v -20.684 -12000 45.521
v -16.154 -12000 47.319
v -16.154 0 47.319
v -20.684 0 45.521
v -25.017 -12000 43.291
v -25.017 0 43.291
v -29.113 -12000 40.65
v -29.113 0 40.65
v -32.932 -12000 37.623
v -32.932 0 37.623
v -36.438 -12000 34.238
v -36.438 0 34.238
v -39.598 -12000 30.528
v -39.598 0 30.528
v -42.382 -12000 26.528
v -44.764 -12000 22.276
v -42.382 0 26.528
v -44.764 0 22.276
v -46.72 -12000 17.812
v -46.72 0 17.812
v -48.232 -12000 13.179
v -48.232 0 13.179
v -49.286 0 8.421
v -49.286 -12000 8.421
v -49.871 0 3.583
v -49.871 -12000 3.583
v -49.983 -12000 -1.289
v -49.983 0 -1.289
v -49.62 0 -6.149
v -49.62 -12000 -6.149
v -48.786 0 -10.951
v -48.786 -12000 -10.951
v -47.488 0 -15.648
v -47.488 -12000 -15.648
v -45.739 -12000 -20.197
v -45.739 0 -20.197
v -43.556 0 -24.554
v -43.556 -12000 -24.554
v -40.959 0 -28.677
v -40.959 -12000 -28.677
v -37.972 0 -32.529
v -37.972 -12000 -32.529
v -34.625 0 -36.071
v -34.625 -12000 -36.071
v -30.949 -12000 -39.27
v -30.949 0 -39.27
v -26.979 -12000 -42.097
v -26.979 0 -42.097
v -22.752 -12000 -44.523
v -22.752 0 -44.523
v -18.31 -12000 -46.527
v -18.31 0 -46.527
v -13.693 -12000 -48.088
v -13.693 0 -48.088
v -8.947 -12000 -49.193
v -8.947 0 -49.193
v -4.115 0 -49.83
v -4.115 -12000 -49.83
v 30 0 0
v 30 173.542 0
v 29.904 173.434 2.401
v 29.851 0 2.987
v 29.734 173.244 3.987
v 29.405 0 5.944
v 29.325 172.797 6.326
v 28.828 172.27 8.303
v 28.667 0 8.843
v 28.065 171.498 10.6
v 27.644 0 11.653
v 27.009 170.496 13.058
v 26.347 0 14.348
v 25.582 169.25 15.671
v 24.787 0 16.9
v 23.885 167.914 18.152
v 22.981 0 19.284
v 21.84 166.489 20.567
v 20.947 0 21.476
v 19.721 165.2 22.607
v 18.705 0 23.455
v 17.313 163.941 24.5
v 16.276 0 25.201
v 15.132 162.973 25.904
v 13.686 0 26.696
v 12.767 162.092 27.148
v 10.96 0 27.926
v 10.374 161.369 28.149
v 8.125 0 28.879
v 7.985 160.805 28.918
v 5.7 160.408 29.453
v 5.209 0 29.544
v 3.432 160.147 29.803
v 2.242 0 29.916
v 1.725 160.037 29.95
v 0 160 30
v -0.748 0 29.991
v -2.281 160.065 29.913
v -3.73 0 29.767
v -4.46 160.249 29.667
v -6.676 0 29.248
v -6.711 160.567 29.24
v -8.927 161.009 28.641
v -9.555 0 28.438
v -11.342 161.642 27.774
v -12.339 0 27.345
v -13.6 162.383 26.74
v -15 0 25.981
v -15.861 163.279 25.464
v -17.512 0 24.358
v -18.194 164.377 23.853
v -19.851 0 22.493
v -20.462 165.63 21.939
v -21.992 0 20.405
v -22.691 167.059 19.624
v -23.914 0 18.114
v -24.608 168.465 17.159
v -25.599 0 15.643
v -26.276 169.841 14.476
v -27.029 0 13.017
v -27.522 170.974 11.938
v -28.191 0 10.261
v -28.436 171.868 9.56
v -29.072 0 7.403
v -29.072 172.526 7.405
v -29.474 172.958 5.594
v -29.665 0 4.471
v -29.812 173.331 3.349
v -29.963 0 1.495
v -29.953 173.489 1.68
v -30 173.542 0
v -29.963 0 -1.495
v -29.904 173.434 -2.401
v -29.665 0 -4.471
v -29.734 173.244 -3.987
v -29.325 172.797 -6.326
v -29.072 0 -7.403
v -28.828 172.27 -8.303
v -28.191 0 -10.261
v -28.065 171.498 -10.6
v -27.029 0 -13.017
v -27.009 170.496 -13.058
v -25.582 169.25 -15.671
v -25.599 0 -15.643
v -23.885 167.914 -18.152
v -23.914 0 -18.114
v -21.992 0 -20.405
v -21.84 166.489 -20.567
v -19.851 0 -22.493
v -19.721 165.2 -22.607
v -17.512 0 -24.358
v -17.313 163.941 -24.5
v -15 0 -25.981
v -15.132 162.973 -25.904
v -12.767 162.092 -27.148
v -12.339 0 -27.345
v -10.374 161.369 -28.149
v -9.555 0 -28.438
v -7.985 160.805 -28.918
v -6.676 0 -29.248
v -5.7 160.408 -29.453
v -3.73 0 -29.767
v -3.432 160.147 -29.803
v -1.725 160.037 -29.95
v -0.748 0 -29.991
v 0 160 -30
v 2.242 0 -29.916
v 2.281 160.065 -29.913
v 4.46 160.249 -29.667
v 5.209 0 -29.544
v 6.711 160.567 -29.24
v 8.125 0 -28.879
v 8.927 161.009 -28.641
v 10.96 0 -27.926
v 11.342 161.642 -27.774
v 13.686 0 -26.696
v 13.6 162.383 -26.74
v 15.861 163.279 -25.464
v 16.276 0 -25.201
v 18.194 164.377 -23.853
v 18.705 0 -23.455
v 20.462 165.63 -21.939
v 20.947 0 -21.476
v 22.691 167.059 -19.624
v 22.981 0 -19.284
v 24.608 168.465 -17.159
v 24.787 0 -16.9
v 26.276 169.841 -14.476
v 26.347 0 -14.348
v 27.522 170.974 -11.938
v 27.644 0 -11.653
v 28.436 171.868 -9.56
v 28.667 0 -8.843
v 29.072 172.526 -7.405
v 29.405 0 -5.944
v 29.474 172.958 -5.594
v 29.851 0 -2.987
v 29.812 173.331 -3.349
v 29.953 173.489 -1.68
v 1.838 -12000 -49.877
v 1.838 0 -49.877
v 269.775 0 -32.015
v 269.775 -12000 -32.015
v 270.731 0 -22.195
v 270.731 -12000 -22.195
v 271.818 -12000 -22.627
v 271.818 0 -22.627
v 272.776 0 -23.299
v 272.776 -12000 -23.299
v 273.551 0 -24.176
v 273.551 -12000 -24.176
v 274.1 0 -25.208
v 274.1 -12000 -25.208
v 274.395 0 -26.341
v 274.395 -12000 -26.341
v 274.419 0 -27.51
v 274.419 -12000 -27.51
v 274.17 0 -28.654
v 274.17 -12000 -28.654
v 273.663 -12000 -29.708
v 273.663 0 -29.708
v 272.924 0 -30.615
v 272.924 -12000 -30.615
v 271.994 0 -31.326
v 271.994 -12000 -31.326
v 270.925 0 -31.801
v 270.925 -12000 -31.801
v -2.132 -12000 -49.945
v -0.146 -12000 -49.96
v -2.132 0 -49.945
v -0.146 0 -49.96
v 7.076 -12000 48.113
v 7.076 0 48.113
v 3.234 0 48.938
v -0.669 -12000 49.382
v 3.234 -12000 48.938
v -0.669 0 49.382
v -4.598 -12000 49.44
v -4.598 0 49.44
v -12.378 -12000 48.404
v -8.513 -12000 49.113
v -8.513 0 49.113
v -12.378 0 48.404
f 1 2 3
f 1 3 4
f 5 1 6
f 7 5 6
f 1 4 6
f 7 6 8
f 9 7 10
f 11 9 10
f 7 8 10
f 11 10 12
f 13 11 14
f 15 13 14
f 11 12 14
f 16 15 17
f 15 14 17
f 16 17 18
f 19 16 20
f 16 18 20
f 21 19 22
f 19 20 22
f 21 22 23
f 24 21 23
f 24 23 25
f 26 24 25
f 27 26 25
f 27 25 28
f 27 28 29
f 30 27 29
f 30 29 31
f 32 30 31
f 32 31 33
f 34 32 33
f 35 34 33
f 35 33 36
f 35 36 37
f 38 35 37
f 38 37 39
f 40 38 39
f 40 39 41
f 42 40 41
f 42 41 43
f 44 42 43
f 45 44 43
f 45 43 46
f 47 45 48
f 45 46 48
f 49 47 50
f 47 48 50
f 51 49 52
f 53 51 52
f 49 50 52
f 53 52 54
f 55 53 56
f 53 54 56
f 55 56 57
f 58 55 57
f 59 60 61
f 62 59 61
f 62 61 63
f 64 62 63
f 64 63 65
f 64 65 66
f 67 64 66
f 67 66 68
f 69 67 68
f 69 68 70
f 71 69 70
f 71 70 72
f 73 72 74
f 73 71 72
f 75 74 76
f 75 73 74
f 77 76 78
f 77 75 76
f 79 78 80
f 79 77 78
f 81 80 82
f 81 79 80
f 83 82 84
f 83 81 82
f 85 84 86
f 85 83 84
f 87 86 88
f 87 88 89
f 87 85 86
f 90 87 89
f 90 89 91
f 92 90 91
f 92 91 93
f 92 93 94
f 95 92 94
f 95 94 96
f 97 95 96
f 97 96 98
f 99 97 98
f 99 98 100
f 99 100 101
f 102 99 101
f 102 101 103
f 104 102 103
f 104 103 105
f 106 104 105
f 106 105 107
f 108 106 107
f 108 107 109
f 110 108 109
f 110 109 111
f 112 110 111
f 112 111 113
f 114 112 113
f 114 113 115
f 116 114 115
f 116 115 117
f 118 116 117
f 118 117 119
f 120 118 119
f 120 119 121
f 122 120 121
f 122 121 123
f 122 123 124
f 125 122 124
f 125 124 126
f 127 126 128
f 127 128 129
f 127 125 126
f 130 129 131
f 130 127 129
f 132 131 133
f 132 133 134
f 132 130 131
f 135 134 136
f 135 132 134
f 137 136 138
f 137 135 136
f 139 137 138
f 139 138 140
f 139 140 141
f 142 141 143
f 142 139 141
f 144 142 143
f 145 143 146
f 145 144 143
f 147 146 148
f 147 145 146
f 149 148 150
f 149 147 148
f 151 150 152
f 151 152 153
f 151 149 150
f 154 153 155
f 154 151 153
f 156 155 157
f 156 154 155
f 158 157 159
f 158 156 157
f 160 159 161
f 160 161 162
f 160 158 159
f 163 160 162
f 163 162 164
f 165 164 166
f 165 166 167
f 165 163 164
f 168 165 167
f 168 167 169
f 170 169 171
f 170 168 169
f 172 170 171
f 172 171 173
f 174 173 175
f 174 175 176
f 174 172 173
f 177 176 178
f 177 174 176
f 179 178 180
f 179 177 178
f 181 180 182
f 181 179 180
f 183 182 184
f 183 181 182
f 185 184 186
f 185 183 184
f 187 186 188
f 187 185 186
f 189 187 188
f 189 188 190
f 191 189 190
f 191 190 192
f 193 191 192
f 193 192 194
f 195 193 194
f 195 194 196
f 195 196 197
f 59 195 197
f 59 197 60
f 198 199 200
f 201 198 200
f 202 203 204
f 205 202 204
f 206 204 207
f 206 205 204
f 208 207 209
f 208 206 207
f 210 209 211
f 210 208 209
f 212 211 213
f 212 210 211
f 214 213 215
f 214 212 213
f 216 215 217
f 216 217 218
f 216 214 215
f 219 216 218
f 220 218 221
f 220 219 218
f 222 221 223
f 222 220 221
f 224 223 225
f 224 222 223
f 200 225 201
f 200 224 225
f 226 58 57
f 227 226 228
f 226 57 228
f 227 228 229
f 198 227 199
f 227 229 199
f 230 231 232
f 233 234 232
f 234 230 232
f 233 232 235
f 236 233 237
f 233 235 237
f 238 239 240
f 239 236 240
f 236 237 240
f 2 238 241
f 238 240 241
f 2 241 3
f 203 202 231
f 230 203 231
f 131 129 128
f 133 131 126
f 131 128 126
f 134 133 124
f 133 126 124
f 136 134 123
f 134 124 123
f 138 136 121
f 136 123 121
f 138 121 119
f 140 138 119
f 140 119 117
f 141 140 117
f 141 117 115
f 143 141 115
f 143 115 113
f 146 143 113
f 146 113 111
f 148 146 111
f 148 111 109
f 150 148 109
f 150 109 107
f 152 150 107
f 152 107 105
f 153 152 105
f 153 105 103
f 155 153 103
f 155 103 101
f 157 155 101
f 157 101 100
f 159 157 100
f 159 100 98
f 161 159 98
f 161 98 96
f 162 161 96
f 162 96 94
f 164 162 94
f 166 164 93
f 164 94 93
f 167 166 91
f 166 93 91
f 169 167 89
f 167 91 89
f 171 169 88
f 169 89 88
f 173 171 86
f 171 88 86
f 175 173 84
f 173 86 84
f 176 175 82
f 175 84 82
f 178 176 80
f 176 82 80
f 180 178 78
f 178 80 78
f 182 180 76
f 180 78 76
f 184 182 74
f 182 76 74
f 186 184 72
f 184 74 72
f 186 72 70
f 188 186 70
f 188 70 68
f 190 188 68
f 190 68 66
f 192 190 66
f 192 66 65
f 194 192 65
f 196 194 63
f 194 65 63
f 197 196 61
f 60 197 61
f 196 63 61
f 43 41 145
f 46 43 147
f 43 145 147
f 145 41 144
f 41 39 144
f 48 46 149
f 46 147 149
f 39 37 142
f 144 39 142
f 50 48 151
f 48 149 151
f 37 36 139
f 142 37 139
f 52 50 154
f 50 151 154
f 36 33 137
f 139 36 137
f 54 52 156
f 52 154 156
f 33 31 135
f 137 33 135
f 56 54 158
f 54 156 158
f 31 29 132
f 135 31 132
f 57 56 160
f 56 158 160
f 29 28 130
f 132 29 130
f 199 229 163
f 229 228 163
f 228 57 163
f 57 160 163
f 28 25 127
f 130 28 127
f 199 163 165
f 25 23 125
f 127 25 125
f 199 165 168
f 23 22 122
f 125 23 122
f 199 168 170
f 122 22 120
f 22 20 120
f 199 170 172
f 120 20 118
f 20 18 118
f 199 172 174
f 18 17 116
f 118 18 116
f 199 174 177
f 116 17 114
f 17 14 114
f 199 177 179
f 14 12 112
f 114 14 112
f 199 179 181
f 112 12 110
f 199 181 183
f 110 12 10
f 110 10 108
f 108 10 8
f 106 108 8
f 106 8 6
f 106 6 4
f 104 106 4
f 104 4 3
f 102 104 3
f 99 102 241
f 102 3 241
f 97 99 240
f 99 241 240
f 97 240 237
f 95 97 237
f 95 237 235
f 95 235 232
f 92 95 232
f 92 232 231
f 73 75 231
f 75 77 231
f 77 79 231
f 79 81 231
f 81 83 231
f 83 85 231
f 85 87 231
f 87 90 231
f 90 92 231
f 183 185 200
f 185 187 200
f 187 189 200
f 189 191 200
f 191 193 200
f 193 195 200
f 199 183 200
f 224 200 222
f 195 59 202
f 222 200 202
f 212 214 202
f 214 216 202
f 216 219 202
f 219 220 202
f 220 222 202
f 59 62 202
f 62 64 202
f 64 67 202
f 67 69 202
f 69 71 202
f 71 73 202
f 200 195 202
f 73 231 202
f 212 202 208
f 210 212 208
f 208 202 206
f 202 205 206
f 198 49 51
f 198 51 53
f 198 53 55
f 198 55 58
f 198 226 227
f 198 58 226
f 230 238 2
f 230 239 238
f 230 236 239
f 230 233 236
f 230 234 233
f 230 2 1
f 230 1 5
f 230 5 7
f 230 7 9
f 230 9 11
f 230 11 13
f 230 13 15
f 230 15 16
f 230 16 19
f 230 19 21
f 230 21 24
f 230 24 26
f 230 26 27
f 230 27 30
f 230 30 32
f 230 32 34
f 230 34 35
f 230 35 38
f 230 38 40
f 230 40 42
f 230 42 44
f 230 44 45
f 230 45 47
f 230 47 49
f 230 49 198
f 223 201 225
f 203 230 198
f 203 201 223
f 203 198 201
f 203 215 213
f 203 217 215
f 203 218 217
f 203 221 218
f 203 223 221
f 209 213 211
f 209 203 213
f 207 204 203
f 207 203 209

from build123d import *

# Parameters (mm, degrees)
F1_DEPTH    = 12000
F2_T1_DEPTH = 12081.8738417293
F2_T3_DEPTH = 12020.5924187821
F3_T1_DEPTH = 12151.4598397462
F4_R        = 30
F5_DEPTH    = 200
F7_DEPTH    = 50


# Not quite as in the source:
# - a fillet or chamfer that OpenCascade refuses, or shapes differently, is made with other operations: its cross-section is extruded or revolved along the edge and cut away or added


with BuildPart() as f1:
    # F0 (on Front) → F1 (new body)
    with BuildSketch(Plane.XZ):
        with BuildLine():
            Line((0, -30), (0, 50))
            ThreePointArc((0, 50), (-50, 0), (0, -50))
            Line((0, -50), (0, -30))
        make_face()
        Polygon((300, -30), (0, 50), (0, -30), align=None)
        Polygon((300, -30), (0, -30), (0, -50), align=None)
    extrude(amount=F1_DEPTH)

    # F2: fillet of radius 40 on 2 edges, made by hand

    # F2_s2 → F2_t1 (cut)
    with BuildSketch(Plane.XZ.offset(-40.9369208646)):
        with BuildLine():
            ThreePointArc((7.0757568477, 48.1131315073), (-4.5979720129, 49.4403608659), (-16.1537458737, 47.3186696162))
            ThreePointArc((-16.1537458737, 47.3186696162), (-8.1873841729, 49.325112675), (0, 50))
            Line((0, 50), (7.0757568477, 48.1131315073))
        make_face()
    extrude(amount=F2_T1_DEPTH, mode=Mode.SUBTRACT)

    # F2_s4 → F2_t3 (cut)
    with BuildSketch(Plane.XZ.offset(-10.296209391)):
        with BuildLine():
            ThreePointArc((-4.1149894068, -49.8303809155), (-1.1394908774, -49.9648240658), (1.8377625396, -49.8774824974))
            Line((1.8377625396, -49.8774824974), (0, -50))
            ThreePointArc((0, -50), (-2.0592418782, -49.957577232), (-4.1149894068, -49.8303809155))
        make_face()
    extrude(amount=F2_T3_DEPTH, mode=Mode.SUBTRACT)

    # F3: fillet of radius 5 on 1 edges, made by hand

    # F3_s2 → F3_t1 (cut)
    with BuildSketch(Plane.XZ.offset(-75.7299198731)):
        with BuildLine():
            ThreePointArc((270.7308421782, -22.1948912475), (274.4190165752, -27.51039091), (269.775123978, -32.0149917348))
            Line((269.775123978, -32.0149917348), (300, -30))
            Line((300, -30), (270.7308421782, -22.1948912475))
        make_face()
    extrude(amount=F3_T1_DEPTH, mode=Mode.SUBTRACT)

    # F4 (on Front) → F5 (join)
    with BuildSketch(Plane.XZ):
        Circle(F4_R)
    extrude(amount=-F5_DEPTH)

    # F6 (on Top) → F7 (cut, symmetric)
    with BuildSketch(Plane.XY):
        with BuildLine():
            ThreePointArc((0, 160), (28.2842712475, 171.7157287525), (40, 200))
            ThreePointArc((40, 200), (-28.2842712475, 228.2842712475), (0, 160))
        make_face()
    extrude(amount=F7_DEPTH, both=True, mode=Mode.SUBTRACT)


solid = f1.part
